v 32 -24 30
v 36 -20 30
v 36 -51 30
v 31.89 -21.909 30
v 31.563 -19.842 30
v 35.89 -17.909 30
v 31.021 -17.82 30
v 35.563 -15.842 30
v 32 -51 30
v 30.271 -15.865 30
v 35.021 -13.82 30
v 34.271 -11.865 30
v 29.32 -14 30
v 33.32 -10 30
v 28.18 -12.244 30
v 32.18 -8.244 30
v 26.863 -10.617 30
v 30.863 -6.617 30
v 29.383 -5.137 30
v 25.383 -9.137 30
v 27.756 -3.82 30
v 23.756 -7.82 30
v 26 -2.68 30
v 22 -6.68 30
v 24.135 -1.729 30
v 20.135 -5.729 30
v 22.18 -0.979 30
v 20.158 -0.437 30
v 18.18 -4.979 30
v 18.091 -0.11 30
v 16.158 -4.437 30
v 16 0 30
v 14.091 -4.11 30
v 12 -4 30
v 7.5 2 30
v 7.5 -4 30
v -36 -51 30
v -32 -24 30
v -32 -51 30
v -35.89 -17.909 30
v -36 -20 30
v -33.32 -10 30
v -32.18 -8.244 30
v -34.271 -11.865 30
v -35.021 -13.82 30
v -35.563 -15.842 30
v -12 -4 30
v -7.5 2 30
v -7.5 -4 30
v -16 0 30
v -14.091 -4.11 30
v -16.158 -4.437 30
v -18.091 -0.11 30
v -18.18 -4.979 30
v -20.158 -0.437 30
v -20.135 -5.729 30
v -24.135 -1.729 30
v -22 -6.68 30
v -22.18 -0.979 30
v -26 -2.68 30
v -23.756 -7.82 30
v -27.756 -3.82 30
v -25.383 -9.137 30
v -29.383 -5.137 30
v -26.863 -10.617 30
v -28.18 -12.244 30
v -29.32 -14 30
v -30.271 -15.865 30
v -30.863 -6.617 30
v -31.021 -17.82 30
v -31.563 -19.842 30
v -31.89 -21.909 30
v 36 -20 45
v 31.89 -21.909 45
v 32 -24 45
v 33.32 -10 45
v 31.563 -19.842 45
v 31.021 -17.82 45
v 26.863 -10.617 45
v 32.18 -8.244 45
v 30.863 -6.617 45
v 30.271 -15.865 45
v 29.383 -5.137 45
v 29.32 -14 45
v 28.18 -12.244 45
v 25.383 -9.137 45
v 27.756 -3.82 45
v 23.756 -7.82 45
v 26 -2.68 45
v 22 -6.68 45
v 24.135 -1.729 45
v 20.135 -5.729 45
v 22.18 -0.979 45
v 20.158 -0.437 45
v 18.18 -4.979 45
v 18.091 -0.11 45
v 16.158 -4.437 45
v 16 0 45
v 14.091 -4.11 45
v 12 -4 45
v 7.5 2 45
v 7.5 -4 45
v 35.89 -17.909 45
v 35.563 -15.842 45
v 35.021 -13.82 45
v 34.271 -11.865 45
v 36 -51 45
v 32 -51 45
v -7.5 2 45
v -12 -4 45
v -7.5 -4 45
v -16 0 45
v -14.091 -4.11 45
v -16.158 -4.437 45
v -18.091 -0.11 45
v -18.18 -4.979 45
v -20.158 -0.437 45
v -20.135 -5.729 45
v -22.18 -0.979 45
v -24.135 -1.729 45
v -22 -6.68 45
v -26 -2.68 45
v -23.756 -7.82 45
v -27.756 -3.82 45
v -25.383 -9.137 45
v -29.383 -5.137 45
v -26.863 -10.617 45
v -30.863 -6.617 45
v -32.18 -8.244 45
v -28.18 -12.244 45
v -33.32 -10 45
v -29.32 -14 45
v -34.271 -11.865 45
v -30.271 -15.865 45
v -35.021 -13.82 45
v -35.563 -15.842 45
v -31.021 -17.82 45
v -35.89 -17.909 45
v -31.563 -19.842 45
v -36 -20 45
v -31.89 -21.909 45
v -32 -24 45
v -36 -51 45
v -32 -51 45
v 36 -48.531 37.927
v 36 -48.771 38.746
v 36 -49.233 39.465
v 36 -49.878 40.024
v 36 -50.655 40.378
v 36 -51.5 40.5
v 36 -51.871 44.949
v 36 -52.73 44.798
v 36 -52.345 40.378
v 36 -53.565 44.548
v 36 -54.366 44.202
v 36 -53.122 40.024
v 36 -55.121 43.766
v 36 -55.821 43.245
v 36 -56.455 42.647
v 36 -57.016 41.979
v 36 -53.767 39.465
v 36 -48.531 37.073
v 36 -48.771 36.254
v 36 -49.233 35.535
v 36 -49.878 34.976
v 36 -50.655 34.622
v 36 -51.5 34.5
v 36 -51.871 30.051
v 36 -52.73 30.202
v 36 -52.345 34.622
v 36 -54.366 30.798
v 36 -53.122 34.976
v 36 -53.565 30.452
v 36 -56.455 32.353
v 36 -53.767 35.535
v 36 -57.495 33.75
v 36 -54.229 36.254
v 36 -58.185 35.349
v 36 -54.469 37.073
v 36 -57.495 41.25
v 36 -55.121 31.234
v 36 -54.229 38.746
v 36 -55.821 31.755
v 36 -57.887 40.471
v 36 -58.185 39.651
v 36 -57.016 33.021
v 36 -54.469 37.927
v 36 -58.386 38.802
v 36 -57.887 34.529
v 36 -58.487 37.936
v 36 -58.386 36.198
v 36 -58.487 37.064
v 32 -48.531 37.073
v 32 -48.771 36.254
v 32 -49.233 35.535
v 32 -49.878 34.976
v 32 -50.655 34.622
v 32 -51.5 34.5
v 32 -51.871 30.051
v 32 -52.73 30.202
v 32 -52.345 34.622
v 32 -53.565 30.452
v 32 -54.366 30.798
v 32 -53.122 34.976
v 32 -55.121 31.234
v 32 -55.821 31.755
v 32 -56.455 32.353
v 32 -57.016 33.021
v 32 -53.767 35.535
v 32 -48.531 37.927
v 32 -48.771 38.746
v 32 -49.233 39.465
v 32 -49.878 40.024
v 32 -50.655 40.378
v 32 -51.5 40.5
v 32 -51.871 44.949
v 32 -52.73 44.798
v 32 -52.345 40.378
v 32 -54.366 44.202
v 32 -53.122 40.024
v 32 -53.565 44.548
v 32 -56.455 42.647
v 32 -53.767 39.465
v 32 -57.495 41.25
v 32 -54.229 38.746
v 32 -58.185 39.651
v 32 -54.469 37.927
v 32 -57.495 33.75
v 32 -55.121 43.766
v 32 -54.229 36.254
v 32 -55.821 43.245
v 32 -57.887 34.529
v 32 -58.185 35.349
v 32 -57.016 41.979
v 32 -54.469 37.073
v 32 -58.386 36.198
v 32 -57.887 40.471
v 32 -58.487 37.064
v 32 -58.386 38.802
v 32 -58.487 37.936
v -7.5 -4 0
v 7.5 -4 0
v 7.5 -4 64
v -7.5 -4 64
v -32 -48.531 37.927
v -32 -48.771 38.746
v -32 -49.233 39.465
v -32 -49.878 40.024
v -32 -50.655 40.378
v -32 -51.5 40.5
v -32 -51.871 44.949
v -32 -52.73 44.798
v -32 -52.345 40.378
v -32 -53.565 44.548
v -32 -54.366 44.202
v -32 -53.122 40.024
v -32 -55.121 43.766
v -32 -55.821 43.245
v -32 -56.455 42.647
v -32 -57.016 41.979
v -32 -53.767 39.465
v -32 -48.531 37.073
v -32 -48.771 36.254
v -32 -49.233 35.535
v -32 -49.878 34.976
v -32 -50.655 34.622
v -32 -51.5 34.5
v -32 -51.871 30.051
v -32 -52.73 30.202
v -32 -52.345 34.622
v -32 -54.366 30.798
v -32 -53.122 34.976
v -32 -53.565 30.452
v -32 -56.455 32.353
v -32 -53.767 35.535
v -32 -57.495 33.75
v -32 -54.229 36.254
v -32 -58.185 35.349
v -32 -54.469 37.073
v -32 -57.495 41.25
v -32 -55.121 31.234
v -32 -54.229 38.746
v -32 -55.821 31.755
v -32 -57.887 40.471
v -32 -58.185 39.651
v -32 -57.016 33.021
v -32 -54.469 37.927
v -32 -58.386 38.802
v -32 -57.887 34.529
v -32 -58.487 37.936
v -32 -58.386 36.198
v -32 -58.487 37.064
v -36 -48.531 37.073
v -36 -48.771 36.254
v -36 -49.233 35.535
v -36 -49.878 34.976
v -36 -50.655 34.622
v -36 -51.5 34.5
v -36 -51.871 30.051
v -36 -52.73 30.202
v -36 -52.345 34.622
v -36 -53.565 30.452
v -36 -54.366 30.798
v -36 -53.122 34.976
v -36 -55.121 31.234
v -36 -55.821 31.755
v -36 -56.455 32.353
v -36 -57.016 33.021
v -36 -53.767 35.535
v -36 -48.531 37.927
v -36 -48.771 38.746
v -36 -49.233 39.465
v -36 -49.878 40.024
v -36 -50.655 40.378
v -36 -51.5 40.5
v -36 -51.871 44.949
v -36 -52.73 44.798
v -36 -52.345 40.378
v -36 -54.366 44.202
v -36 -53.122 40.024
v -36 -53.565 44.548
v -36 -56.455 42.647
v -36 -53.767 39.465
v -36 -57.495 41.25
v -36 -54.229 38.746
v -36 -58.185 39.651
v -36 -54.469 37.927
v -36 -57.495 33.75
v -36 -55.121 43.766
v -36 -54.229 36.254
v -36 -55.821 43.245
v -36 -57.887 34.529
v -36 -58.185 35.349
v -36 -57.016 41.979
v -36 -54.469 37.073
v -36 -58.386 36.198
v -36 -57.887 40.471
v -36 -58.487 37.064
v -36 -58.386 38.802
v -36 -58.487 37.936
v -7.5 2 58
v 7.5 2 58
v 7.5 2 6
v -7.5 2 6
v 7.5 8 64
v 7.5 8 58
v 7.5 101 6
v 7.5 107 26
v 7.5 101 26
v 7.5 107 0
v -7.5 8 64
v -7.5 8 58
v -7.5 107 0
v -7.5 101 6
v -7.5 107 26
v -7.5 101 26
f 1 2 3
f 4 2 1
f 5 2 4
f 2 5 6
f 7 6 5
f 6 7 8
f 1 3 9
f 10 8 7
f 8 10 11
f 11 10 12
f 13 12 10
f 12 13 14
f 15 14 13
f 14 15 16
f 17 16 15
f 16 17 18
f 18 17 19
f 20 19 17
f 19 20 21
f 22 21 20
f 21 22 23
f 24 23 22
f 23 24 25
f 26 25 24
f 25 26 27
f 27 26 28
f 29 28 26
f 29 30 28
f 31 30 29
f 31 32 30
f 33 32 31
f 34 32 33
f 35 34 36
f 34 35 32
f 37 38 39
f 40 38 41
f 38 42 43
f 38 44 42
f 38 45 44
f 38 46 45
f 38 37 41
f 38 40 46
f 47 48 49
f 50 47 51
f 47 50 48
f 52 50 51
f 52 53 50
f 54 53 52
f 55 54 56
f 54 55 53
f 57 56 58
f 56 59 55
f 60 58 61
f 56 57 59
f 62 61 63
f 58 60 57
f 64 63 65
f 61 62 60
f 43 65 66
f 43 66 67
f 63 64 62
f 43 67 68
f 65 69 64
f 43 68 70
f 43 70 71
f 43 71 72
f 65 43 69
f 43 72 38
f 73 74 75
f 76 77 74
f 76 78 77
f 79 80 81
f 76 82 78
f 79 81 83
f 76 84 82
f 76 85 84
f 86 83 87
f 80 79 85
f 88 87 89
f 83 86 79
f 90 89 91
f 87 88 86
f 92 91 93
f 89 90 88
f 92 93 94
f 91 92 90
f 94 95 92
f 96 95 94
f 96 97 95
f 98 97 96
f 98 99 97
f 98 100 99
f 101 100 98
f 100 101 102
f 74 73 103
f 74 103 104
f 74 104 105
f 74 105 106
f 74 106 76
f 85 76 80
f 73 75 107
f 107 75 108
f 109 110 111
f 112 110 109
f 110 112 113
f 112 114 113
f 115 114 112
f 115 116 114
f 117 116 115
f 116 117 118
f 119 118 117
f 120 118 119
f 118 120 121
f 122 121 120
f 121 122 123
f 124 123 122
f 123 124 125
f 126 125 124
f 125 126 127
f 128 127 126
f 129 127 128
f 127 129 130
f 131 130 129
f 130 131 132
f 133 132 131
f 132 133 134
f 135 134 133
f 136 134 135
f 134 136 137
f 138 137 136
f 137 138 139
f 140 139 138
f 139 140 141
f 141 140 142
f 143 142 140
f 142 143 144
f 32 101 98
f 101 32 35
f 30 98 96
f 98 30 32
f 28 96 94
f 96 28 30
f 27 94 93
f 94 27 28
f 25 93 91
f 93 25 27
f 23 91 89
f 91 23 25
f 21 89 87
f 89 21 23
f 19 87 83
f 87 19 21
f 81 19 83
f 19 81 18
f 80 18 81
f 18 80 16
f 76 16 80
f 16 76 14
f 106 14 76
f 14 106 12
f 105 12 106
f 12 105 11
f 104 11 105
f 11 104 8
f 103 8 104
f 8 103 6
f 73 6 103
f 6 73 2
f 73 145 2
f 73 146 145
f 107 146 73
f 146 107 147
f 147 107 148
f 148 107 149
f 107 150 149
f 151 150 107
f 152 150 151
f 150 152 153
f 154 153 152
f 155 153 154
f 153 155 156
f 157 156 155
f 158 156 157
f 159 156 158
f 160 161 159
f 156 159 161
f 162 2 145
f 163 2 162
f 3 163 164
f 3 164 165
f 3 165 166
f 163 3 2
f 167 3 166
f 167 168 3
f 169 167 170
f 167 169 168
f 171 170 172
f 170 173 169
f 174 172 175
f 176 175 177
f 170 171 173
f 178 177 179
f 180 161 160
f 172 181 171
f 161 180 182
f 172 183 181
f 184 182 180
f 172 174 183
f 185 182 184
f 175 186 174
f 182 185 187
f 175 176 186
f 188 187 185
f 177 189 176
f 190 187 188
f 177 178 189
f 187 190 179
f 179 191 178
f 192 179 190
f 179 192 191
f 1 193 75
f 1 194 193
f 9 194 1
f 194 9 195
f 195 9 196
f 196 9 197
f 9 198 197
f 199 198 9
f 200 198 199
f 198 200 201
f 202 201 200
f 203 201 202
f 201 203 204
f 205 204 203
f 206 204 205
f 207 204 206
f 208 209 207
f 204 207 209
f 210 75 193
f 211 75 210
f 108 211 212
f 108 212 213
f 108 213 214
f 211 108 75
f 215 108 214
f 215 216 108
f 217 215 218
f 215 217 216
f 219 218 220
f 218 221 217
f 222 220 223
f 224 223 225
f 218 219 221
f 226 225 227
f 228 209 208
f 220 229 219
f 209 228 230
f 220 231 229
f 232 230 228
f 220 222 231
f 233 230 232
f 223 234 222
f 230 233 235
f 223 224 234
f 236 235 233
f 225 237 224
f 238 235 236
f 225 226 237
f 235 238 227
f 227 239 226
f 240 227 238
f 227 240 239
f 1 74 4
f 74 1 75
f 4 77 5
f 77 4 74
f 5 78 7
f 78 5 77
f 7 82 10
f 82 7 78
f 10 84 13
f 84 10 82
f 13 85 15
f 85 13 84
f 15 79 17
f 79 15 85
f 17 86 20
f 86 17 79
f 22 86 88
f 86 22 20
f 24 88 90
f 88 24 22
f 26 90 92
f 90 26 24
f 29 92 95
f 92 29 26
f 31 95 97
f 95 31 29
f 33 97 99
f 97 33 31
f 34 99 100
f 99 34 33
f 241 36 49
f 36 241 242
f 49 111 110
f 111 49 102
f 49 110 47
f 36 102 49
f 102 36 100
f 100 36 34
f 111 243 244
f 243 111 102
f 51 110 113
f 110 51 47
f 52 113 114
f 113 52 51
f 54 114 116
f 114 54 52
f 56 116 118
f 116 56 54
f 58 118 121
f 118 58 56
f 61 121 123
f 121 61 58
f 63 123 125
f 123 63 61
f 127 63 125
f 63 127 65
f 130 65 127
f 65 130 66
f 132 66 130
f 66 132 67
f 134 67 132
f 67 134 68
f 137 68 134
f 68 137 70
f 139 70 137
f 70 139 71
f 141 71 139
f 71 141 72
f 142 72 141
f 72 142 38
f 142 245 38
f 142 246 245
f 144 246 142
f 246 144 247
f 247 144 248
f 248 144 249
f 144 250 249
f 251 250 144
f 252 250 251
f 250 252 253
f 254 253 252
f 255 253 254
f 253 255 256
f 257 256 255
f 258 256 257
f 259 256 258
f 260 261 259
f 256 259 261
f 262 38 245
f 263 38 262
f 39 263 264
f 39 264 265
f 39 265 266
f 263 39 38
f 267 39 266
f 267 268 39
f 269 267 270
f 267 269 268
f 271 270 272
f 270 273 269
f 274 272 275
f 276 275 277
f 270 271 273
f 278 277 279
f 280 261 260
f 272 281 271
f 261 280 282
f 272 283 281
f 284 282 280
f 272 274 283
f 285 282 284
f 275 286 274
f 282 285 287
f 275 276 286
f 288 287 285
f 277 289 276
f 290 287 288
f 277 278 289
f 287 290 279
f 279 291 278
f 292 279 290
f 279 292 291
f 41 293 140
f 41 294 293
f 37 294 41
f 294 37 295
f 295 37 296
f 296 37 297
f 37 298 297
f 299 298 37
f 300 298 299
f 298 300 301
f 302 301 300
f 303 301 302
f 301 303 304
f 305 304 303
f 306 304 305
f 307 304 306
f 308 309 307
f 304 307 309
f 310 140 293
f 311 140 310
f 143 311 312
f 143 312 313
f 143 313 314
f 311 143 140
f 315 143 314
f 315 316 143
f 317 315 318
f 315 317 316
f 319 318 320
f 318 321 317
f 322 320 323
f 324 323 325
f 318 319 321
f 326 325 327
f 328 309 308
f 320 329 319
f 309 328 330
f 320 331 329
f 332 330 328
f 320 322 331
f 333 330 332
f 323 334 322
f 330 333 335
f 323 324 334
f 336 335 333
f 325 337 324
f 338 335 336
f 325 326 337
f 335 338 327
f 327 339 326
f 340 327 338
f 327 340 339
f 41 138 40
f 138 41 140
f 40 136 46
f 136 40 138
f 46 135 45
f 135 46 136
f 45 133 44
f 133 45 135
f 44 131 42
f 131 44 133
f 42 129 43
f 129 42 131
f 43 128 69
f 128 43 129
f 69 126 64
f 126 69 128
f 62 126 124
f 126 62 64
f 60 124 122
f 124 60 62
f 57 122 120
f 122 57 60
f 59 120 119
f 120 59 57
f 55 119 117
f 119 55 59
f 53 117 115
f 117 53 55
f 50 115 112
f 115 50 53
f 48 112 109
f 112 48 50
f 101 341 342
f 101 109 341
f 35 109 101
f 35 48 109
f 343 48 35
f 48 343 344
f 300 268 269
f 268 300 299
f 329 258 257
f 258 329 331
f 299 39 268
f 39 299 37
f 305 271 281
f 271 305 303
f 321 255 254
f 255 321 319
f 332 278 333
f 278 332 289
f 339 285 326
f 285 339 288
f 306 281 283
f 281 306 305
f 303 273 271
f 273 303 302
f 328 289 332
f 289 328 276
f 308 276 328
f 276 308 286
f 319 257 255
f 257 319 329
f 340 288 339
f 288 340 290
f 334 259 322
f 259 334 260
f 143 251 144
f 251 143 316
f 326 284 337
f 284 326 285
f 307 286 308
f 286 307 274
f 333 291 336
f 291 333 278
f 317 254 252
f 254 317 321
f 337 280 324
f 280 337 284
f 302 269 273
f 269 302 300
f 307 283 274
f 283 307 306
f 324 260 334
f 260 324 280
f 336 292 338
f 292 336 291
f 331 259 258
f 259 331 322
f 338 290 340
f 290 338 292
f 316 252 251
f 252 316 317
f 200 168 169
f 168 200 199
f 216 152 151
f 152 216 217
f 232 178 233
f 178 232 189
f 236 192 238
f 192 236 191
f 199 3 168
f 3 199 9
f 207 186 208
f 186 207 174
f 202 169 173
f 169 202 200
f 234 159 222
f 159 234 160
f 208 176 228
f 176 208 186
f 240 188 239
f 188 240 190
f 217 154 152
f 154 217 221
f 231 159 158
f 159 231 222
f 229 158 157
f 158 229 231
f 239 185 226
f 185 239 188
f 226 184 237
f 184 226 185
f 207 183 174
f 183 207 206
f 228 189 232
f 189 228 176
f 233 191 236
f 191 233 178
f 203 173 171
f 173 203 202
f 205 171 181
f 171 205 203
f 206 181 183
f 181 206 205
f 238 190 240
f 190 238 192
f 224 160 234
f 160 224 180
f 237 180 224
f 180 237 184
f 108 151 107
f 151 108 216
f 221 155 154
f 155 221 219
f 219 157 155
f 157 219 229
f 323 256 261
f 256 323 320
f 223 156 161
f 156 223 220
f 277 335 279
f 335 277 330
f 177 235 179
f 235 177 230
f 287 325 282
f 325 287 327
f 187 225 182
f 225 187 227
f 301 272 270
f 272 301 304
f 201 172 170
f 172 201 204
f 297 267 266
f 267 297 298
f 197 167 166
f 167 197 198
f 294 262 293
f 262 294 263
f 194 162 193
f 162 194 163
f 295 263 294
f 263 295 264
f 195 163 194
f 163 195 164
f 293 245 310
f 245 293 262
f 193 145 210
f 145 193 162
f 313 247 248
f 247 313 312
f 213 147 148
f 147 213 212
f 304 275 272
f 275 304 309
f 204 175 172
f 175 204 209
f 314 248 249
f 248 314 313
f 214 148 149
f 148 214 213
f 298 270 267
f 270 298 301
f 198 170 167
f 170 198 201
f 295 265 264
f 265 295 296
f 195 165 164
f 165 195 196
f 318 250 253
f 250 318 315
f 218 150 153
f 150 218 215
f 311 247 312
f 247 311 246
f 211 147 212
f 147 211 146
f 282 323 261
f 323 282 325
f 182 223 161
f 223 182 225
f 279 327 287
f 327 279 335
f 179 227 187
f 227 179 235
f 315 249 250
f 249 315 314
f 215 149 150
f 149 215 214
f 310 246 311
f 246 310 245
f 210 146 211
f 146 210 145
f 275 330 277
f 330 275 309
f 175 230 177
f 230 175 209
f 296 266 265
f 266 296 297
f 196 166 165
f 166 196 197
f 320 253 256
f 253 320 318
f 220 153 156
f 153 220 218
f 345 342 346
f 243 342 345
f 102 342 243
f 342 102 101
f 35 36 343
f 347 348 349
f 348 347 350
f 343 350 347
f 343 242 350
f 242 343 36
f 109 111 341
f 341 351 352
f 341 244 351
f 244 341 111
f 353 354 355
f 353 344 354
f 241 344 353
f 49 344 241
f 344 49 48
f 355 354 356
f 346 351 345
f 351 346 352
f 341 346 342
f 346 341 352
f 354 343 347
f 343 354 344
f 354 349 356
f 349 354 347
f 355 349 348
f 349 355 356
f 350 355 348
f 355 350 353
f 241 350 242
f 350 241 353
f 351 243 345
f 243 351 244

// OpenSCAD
$fa = 6;
$fs = 1.75 / 2;

inner_width = 64;
inner_height = 55;
head_thickness = 4;
clip_thickness = 6;

outer_width = inner_width + head_thickness * 2;
outer_height = inner_height + head_thickness;

// Mic head holder
translate([0, 0, 30])
translate([-outer_width / 2, 0, 0])
mirror([0, 1, 0])
difference() {
    union() {
        // Top arms
        linear_extrude(height = 15) {
            curvature = 20;

            difference() {
                translate([curvature, curvature, 0])
                minkowski() {
                    square([outer_width - 2 * curvature, outer_height]);
                    circle(r = curvature);
                }

                translate([head_thickness, head_thickness, 0])
                translate([curvature, curvature, 0])
                minkowski() {
                    square([inner_width - 2 * curvature, inner_height]);
                    circle(r = curvature);
                }

                translate([0, inner_height - head_thickness, 0])
                square(outer_width, 100);
            }

            // Cleanly match the thickness of the screen clip
            thickness_difference = abs(head_thickness - clip_thickness);
            connected_width = 32;

            translate([outer_width / 2 - connected_width / 2, -thickness_difference, 0])
            polygon([
                [0, thickness_difference],
                [(connected_width - 15) / 2, 0],
                [(connected_width - 15) / 2 + 15, 0],
                [connected_width, thickness_difference],
            ]);
        }

        // Curved tops
        translate([0, inner_height - head_thickness, 7.5])
        rotate(a = 90, v = [0, 1, 0])
        cylinder(h = head_thickness, r = 7.5);

        translate([inner_width + head_thickness, inner_height - head_thickness, 7.5])
        rotate(a = 90, v = [0, 1, 0])
        cylinder(h = head_thickness, r = 7.5);
    }

    // Screw/bolt holes
    union() {
        // For head
        translate([-5, outer_height - 7.5, 7.5])
        rotate(a = 90, v = [0, 1, 0])
        cylinder(h = outer_width + 10, r = 3);
    }
}

screen_depth = 52;
inset_height = 99;
back_tab_size = 20;
front_tab_size = 6;

// Screen clip
translate([7.5, -head_thickness, 0])
rotate(a = -90, v = [0, 1, 0])
difference() {
    // Clip
    union() {
        linear_extrude(height = 15) {
            difference() {
                square([screen_depth + clip_thickness * 2, inset_height + clip_thickness * 2]);

                translate([clip_thickness, clip_thickness, 0])
                square([screen_depth, inset_height]);

                translate([clip_thickness + back_tab_size, clip_thickness + front_tab_size, 0])
                square([screen_depth, inset_height]);
            }
        }
    }
}
